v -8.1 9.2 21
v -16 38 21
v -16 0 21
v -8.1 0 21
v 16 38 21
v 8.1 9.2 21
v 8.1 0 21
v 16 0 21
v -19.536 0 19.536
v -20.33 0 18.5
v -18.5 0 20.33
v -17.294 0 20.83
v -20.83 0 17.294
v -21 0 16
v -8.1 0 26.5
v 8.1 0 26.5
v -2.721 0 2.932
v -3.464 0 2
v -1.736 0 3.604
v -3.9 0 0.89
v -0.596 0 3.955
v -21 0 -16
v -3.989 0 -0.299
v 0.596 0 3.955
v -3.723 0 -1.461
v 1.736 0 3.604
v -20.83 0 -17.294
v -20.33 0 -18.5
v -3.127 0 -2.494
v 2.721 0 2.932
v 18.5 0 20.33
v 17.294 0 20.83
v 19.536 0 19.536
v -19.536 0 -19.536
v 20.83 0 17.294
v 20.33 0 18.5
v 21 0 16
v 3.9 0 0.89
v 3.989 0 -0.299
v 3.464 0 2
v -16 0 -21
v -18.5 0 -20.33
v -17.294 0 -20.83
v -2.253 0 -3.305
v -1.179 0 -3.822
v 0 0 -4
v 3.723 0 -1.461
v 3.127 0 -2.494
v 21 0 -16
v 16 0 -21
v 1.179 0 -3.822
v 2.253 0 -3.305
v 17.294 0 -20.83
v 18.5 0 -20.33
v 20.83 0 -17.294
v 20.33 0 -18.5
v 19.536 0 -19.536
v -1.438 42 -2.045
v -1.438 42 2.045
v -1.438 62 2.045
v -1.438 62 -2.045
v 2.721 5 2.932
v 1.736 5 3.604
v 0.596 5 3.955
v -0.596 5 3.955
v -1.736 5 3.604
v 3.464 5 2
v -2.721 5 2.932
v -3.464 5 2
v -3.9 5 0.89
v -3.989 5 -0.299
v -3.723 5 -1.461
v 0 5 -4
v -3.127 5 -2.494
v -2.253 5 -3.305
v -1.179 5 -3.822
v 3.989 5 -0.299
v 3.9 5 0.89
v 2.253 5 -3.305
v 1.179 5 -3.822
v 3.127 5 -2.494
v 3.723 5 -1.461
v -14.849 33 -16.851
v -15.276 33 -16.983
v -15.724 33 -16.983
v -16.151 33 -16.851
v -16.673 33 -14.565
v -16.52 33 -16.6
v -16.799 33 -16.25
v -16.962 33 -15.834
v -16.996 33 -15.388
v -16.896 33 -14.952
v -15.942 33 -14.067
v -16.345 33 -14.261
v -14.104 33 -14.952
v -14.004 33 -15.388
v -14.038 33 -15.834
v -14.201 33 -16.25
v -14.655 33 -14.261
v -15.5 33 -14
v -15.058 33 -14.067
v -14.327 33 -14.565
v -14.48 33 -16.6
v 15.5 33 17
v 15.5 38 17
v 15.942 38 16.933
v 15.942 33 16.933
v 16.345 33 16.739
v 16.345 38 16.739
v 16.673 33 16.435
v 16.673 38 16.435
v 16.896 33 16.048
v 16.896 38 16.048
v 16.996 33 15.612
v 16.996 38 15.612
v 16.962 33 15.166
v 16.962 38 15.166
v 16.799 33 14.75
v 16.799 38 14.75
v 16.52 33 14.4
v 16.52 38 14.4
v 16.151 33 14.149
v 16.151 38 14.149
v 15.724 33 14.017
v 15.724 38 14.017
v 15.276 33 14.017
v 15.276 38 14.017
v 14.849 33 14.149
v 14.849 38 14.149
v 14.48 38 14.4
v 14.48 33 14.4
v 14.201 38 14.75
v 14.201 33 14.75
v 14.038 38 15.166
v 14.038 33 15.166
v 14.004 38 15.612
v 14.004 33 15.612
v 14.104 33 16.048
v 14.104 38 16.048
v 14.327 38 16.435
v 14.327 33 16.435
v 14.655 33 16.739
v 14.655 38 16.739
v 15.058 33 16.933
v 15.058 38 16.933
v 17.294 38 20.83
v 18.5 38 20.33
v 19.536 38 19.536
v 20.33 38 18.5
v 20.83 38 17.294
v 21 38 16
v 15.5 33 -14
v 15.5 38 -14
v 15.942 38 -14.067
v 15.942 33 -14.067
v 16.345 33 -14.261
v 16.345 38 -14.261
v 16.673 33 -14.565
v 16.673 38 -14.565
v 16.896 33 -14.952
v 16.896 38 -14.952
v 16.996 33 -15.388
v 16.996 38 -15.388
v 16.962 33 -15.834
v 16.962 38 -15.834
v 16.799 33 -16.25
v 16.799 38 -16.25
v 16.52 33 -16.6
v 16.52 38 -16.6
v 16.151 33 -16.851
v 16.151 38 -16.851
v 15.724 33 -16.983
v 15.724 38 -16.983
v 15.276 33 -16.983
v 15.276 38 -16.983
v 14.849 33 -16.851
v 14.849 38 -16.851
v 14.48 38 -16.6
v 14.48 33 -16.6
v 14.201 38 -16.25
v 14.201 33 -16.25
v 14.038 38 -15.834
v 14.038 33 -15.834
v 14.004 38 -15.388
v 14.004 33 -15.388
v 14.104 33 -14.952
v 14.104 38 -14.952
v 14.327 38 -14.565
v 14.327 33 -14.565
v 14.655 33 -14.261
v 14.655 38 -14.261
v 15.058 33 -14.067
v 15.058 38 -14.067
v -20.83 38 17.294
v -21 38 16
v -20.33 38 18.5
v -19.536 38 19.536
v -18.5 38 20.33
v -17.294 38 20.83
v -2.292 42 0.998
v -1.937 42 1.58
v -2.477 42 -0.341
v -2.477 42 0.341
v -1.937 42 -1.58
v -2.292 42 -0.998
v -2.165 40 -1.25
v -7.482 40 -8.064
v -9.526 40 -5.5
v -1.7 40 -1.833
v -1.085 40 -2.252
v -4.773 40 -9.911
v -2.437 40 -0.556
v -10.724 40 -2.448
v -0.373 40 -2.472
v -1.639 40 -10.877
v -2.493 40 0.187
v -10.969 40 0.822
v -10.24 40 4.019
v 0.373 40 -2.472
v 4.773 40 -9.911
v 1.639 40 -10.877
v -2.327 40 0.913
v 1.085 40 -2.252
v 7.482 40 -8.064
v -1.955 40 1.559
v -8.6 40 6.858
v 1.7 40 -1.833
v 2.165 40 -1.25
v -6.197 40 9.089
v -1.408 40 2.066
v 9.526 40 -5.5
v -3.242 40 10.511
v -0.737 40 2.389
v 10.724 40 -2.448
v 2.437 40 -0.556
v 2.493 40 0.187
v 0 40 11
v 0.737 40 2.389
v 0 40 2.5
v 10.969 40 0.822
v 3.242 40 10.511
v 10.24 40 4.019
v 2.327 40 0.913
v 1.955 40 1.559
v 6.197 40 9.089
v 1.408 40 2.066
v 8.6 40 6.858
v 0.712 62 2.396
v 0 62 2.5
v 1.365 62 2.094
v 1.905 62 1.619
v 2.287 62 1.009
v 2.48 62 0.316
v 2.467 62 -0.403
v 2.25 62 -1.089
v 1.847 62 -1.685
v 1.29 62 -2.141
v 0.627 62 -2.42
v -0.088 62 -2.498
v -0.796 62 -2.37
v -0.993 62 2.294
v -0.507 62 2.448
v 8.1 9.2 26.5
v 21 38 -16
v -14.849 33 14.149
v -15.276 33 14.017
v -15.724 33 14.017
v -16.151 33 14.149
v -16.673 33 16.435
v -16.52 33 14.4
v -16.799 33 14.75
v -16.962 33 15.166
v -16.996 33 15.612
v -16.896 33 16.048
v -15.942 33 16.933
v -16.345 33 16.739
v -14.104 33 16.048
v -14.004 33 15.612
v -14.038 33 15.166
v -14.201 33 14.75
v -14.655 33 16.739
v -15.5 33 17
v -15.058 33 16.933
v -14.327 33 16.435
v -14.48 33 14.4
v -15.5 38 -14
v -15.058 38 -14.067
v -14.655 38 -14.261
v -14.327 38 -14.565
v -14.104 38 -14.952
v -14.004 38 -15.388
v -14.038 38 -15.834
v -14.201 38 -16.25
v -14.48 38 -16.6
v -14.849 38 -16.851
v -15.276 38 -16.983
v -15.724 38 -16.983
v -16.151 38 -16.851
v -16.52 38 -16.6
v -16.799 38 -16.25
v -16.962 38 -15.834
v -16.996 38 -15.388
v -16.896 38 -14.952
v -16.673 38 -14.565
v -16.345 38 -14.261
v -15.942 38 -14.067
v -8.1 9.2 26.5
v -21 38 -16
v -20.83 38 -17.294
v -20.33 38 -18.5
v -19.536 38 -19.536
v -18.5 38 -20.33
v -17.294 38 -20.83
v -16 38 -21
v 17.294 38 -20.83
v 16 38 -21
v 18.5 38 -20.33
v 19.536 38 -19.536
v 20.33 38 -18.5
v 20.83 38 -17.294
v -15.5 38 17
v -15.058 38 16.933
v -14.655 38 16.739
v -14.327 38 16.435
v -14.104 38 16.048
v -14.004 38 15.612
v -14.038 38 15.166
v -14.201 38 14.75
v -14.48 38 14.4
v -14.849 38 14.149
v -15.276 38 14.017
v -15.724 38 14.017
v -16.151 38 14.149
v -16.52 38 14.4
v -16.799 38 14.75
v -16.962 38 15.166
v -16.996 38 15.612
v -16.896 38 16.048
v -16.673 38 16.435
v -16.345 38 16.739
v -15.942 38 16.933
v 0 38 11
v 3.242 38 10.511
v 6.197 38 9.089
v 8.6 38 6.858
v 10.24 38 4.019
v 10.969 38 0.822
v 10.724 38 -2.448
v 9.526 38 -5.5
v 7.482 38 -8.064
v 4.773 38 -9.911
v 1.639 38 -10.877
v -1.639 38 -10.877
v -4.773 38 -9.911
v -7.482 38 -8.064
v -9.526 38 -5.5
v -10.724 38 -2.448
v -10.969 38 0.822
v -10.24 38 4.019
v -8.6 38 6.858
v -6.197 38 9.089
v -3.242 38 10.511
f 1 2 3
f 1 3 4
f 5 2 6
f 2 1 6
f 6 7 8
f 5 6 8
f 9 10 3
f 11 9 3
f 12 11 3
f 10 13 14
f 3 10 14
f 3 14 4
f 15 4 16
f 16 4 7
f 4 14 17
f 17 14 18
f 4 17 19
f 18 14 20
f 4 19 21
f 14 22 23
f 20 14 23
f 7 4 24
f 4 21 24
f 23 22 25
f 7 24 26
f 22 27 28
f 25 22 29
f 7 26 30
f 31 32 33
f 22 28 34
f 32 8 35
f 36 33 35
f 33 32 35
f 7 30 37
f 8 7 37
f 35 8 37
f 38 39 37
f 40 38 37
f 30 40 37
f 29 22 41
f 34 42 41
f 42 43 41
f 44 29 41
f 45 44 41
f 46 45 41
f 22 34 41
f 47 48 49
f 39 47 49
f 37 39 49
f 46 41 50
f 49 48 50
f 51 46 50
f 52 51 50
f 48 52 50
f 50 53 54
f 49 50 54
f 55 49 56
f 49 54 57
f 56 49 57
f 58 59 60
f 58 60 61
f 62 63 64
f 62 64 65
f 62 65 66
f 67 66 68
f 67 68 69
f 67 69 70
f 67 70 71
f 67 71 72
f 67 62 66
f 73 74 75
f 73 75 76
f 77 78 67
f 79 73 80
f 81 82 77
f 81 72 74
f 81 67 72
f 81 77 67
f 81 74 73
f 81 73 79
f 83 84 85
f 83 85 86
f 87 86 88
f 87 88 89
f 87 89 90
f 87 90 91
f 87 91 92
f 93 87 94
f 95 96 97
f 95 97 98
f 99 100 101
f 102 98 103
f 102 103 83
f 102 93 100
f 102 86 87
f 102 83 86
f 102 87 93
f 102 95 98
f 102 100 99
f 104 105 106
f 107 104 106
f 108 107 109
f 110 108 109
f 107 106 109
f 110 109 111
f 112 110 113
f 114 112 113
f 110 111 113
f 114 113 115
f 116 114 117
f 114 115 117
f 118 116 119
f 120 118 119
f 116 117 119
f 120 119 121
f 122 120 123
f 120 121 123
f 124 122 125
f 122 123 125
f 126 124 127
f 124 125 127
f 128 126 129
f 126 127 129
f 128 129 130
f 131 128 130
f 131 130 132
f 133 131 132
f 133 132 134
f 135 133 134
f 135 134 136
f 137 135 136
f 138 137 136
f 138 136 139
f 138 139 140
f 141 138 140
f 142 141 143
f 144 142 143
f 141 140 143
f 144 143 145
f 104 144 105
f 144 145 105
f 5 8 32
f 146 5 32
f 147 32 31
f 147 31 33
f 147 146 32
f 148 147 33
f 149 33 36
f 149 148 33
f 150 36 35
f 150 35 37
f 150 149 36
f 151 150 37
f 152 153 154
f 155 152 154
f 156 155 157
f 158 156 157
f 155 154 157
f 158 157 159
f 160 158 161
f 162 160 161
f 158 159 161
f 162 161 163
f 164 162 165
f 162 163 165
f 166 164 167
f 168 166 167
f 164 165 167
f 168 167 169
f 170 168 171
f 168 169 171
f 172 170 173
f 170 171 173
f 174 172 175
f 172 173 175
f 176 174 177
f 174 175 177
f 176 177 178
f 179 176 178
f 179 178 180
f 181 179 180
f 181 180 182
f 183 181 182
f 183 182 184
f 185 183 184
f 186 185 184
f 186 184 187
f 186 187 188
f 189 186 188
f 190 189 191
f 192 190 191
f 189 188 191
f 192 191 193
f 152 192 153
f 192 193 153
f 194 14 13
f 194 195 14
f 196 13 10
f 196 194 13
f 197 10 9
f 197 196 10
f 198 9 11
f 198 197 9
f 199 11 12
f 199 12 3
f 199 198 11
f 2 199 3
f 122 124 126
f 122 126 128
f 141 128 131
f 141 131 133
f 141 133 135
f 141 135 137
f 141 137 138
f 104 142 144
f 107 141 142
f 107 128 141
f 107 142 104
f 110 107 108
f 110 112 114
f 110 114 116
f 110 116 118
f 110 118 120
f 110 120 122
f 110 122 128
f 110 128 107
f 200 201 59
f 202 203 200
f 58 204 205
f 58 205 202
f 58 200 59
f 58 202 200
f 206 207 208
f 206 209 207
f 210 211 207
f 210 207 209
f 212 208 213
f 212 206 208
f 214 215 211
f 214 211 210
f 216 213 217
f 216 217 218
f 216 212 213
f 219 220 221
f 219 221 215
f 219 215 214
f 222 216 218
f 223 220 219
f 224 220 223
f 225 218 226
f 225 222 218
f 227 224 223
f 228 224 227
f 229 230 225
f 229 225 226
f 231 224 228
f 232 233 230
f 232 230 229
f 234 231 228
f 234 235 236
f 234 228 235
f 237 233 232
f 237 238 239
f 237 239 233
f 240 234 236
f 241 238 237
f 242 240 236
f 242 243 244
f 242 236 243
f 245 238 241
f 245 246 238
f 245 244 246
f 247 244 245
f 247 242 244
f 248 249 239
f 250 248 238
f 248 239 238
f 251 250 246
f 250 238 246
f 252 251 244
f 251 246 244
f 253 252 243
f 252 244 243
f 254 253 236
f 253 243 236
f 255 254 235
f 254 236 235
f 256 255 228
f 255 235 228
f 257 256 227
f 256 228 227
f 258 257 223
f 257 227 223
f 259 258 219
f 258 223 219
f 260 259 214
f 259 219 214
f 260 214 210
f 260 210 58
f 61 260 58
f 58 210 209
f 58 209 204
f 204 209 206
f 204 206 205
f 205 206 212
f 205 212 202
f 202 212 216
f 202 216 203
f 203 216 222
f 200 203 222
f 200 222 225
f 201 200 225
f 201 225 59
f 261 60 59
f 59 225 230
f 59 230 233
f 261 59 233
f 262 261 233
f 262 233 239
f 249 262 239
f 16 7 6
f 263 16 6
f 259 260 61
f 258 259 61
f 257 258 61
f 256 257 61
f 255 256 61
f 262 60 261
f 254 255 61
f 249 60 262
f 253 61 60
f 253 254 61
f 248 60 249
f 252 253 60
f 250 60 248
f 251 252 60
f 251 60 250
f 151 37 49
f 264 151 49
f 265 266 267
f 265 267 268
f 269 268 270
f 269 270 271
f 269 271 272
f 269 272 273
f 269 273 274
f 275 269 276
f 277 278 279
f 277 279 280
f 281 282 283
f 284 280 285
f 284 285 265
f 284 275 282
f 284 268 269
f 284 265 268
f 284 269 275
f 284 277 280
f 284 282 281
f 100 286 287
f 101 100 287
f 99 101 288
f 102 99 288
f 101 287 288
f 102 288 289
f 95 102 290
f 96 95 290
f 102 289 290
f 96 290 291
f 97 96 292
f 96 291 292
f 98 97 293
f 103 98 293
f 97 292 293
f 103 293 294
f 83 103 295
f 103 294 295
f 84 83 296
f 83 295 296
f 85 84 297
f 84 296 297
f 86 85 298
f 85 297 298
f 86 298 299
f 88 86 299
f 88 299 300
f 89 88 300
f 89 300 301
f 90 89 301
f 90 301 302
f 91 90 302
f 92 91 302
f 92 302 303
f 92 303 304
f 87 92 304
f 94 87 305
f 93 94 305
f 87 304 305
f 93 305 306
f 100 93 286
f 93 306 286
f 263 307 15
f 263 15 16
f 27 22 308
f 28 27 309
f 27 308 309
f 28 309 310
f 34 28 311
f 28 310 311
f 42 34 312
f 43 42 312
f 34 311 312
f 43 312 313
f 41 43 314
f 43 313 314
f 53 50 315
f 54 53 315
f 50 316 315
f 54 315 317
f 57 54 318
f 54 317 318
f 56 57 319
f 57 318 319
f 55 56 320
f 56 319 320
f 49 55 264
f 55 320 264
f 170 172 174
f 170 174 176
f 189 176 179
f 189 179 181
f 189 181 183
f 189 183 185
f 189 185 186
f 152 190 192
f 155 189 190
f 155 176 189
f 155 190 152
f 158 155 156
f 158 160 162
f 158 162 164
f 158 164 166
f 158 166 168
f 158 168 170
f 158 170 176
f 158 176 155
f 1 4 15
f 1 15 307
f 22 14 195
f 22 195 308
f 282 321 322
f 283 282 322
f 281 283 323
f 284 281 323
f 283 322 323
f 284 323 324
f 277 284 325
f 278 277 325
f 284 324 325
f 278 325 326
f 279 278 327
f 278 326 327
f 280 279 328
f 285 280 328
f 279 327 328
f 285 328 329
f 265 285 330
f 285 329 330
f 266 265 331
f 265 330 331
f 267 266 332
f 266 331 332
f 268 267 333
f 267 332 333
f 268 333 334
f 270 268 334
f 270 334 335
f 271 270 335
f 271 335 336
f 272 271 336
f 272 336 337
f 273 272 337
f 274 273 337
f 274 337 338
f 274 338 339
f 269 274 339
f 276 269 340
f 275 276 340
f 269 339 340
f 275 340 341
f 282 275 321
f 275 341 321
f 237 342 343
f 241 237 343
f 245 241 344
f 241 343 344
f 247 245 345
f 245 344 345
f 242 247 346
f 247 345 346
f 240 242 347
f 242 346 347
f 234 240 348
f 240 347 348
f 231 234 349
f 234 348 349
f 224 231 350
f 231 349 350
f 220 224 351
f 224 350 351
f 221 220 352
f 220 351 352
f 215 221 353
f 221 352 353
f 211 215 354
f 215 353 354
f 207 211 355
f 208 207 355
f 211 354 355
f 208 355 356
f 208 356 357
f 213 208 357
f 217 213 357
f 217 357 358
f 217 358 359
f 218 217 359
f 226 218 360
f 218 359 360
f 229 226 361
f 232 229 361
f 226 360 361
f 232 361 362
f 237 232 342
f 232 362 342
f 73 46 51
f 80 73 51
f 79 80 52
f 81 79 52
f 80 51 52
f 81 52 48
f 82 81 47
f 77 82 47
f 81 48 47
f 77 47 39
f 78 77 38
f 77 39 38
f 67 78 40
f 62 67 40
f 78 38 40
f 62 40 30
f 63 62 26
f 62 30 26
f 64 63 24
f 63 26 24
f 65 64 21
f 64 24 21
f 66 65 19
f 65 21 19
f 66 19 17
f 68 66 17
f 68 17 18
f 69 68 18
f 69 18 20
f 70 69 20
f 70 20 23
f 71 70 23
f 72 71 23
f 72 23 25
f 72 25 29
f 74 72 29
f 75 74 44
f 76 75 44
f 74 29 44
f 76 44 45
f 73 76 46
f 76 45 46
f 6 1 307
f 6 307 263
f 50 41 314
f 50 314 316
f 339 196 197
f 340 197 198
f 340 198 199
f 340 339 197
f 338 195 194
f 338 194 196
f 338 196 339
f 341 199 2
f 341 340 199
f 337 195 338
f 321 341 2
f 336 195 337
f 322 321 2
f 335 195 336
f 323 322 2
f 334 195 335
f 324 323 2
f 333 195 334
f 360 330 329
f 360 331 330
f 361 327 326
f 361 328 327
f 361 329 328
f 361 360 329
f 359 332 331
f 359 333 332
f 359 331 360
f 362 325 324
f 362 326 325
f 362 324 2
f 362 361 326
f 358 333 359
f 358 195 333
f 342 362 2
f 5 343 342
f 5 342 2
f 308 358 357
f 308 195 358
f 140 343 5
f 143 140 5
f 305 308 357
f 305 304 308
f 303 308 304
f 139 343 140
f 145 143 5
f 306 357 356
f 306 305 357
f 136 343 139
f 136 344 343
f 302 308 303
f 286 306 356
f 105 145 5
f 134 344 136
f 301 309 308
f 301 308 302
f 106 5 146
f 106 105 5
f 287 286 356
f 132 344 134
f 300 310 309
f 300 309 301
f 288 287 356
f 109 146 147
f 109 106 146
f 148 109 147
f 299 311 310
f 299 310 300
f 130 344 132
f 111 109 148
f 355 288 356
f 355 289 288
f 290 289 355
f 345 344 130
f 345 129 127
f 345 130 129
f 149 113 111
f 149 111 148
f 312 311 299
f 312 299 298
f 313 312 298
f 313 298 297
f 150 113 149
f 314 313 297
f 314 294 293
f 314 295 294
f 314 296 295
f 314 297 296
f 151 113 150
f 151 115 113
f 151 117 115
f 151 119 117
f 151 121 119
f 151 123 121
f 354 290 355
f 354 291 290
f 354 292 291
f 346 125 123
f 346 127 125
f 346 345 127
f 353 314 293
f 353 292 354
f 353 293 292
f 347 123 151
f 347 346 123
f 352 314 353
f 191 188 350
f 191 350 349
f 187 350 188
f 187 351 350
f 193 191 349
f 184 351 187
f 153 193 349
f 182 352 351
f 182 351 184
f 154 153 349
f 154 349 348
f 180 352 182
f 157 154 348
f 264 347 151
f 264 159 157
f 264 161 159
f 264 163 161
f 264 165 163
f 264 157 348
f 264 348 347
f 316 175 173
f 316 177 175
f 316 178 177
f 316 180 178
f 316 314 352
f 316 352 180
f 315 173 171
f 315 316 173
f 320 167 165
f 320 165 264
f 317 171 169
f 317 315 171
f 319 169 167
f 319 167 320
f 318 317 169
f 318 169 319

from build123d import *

# Parameters (mm, degrees)
SKETCH_1_W          = 42
SKETCH_1_H          = 42
EXTRUDE_1_DEPTH     = 38
SKETCH_2_R          = 11
EXTRUDE_2_DEPTH     = 2
SKETCH_3_R          = 2.5
EXTRUDE_3_DEPTH     = 22
SKETCH_5_W          = 16.2
SKETCH_5_H          = 9.2
EXTRUDE_4_DEPTH     = 5.5
SKETCH_6_R          = 1.5
CUT_EXTRUDE_1_DEPTH = 5
FILLET_1_R          = 5
SKETCH_7_R          = 4
CUT_EXTRUDE_2_DEPTH = 5
CUT_EXTRUDE_START   = -20
CUT_EXTRUDE_3_DEPTH = 20


with BuildPart() as part:
    # 草图1 → 凸台-拉伸1 (new body)
    with BuildSketch(Plane(origin=(0, 0, 0), x_dir=(1, 0, 0), z_dir=(0, 1, 0))):
        Rectangle(SKETCH_1_W, SKETCH_1_H)
    extrude(amount=EXTRUDE_1_DEPTH)

    # 草图2 → 凸台-拉伸2 (add)
    with BuildSketch(Plane(origin=(0, 38, 0), x_dir=(1, 0, 0), z_dir=(0, 1, 0))):
        with Locations(Location((0, 0, 0), (0, 0, 270))):
            Circle(SKETCH_2_R)
    extrude(amount=EXTRUDE_2_DEPTH)

    # 草图3 → 凸台-拉伸3 (add)
    with BuildSketch(Plane(origin=(0, 40, 0), x_dir=(1, 0, 0), z_dir=(0, 1, 0))):
        with Locations(Location((0, 0, 0), (0, 0, 270))):
            Circle(SKETCH_3_R)
    extrude(amount=EXTRUDE_3_DEPTH)

    # 草图5 → 凸台-拉伸4 (add)
    with BuildSketch(Plane.XY.offset(21)):
        with Locations((0, 4.6)):
            Rectangle(SKETCH_5_W, SKETCH_5_H)
    extrude(amount=EXTRUDE_4_DEPTH)

    # 草图6 → 切除-拉伸1 (cut)
    with BuildSketch(Plane(origin=(0, 38, 0), x_dir=(1, 0, 0), z_dir=(0, 1, 0))):
        with Locations(Location((-15.5, 15.5, 0), (0, 0, 270))):
            Circle(SKETCH_6_R)
        with Locations(Location((15.5, 15.5, 0), (0, 0, 270))):
            Circle(SKETCH_6_R)
        with Locations(Location((15.5, -15.5, 0), (0, 0, 270))):
            Circle(SKETCH_6_R)
        with Locations(Location((-15.5, -15.5, 0), (0, 0, 270))):
            Circle(SKETCH_6_R)
    extrude(amount=-CUT_EXTRUDE_1_DEPTH, mode=Mode.SUBTRACT)

    # 圆角1
    fillet_1_edges = [part.edges().sort_by_distance(p)[0] for p in [
        (21, 19, 21),
        (-21, 19, 21),
        (-21, 19, -21),
        (21, 19, -21),
    ]]
    fillet(fillet_1_edges, radius=FILLET_1_R)

    # 草图7 → 切除-拉伸2 (cut)
    with BuildSketch(Plane.XZ):
        with Locations(Location((0, 0, 0), (0, 0, 270))):
            Circle(SKETCH_7_R)
    extrude(amount=-CUT_EXTRUDE_2_DEPTH, mode=Mode.SUBTRACT)

    # 草图8 → 切除-拉伸3 (cut)
    with BuildSketch(Plane(origin=(0, 62, 0), x_dir=(1, 0, 0), z_dir=(0, 1, 0)).offset(CUT_EXTRUDE_START)):
        with BuildLine():
            Line((-1.438247, -2.044858324), (-1.438247, 2.044858324))
            ThreePointArc((-1.438247, 2.044858324), (-2.5, 0), (-1.438247, -2.044858324))
        make_face()
    extrude(amount=CUT_EXTRUDE_3_DEPTH, mode=Mode.SUBTRACT)


solid = part.part
